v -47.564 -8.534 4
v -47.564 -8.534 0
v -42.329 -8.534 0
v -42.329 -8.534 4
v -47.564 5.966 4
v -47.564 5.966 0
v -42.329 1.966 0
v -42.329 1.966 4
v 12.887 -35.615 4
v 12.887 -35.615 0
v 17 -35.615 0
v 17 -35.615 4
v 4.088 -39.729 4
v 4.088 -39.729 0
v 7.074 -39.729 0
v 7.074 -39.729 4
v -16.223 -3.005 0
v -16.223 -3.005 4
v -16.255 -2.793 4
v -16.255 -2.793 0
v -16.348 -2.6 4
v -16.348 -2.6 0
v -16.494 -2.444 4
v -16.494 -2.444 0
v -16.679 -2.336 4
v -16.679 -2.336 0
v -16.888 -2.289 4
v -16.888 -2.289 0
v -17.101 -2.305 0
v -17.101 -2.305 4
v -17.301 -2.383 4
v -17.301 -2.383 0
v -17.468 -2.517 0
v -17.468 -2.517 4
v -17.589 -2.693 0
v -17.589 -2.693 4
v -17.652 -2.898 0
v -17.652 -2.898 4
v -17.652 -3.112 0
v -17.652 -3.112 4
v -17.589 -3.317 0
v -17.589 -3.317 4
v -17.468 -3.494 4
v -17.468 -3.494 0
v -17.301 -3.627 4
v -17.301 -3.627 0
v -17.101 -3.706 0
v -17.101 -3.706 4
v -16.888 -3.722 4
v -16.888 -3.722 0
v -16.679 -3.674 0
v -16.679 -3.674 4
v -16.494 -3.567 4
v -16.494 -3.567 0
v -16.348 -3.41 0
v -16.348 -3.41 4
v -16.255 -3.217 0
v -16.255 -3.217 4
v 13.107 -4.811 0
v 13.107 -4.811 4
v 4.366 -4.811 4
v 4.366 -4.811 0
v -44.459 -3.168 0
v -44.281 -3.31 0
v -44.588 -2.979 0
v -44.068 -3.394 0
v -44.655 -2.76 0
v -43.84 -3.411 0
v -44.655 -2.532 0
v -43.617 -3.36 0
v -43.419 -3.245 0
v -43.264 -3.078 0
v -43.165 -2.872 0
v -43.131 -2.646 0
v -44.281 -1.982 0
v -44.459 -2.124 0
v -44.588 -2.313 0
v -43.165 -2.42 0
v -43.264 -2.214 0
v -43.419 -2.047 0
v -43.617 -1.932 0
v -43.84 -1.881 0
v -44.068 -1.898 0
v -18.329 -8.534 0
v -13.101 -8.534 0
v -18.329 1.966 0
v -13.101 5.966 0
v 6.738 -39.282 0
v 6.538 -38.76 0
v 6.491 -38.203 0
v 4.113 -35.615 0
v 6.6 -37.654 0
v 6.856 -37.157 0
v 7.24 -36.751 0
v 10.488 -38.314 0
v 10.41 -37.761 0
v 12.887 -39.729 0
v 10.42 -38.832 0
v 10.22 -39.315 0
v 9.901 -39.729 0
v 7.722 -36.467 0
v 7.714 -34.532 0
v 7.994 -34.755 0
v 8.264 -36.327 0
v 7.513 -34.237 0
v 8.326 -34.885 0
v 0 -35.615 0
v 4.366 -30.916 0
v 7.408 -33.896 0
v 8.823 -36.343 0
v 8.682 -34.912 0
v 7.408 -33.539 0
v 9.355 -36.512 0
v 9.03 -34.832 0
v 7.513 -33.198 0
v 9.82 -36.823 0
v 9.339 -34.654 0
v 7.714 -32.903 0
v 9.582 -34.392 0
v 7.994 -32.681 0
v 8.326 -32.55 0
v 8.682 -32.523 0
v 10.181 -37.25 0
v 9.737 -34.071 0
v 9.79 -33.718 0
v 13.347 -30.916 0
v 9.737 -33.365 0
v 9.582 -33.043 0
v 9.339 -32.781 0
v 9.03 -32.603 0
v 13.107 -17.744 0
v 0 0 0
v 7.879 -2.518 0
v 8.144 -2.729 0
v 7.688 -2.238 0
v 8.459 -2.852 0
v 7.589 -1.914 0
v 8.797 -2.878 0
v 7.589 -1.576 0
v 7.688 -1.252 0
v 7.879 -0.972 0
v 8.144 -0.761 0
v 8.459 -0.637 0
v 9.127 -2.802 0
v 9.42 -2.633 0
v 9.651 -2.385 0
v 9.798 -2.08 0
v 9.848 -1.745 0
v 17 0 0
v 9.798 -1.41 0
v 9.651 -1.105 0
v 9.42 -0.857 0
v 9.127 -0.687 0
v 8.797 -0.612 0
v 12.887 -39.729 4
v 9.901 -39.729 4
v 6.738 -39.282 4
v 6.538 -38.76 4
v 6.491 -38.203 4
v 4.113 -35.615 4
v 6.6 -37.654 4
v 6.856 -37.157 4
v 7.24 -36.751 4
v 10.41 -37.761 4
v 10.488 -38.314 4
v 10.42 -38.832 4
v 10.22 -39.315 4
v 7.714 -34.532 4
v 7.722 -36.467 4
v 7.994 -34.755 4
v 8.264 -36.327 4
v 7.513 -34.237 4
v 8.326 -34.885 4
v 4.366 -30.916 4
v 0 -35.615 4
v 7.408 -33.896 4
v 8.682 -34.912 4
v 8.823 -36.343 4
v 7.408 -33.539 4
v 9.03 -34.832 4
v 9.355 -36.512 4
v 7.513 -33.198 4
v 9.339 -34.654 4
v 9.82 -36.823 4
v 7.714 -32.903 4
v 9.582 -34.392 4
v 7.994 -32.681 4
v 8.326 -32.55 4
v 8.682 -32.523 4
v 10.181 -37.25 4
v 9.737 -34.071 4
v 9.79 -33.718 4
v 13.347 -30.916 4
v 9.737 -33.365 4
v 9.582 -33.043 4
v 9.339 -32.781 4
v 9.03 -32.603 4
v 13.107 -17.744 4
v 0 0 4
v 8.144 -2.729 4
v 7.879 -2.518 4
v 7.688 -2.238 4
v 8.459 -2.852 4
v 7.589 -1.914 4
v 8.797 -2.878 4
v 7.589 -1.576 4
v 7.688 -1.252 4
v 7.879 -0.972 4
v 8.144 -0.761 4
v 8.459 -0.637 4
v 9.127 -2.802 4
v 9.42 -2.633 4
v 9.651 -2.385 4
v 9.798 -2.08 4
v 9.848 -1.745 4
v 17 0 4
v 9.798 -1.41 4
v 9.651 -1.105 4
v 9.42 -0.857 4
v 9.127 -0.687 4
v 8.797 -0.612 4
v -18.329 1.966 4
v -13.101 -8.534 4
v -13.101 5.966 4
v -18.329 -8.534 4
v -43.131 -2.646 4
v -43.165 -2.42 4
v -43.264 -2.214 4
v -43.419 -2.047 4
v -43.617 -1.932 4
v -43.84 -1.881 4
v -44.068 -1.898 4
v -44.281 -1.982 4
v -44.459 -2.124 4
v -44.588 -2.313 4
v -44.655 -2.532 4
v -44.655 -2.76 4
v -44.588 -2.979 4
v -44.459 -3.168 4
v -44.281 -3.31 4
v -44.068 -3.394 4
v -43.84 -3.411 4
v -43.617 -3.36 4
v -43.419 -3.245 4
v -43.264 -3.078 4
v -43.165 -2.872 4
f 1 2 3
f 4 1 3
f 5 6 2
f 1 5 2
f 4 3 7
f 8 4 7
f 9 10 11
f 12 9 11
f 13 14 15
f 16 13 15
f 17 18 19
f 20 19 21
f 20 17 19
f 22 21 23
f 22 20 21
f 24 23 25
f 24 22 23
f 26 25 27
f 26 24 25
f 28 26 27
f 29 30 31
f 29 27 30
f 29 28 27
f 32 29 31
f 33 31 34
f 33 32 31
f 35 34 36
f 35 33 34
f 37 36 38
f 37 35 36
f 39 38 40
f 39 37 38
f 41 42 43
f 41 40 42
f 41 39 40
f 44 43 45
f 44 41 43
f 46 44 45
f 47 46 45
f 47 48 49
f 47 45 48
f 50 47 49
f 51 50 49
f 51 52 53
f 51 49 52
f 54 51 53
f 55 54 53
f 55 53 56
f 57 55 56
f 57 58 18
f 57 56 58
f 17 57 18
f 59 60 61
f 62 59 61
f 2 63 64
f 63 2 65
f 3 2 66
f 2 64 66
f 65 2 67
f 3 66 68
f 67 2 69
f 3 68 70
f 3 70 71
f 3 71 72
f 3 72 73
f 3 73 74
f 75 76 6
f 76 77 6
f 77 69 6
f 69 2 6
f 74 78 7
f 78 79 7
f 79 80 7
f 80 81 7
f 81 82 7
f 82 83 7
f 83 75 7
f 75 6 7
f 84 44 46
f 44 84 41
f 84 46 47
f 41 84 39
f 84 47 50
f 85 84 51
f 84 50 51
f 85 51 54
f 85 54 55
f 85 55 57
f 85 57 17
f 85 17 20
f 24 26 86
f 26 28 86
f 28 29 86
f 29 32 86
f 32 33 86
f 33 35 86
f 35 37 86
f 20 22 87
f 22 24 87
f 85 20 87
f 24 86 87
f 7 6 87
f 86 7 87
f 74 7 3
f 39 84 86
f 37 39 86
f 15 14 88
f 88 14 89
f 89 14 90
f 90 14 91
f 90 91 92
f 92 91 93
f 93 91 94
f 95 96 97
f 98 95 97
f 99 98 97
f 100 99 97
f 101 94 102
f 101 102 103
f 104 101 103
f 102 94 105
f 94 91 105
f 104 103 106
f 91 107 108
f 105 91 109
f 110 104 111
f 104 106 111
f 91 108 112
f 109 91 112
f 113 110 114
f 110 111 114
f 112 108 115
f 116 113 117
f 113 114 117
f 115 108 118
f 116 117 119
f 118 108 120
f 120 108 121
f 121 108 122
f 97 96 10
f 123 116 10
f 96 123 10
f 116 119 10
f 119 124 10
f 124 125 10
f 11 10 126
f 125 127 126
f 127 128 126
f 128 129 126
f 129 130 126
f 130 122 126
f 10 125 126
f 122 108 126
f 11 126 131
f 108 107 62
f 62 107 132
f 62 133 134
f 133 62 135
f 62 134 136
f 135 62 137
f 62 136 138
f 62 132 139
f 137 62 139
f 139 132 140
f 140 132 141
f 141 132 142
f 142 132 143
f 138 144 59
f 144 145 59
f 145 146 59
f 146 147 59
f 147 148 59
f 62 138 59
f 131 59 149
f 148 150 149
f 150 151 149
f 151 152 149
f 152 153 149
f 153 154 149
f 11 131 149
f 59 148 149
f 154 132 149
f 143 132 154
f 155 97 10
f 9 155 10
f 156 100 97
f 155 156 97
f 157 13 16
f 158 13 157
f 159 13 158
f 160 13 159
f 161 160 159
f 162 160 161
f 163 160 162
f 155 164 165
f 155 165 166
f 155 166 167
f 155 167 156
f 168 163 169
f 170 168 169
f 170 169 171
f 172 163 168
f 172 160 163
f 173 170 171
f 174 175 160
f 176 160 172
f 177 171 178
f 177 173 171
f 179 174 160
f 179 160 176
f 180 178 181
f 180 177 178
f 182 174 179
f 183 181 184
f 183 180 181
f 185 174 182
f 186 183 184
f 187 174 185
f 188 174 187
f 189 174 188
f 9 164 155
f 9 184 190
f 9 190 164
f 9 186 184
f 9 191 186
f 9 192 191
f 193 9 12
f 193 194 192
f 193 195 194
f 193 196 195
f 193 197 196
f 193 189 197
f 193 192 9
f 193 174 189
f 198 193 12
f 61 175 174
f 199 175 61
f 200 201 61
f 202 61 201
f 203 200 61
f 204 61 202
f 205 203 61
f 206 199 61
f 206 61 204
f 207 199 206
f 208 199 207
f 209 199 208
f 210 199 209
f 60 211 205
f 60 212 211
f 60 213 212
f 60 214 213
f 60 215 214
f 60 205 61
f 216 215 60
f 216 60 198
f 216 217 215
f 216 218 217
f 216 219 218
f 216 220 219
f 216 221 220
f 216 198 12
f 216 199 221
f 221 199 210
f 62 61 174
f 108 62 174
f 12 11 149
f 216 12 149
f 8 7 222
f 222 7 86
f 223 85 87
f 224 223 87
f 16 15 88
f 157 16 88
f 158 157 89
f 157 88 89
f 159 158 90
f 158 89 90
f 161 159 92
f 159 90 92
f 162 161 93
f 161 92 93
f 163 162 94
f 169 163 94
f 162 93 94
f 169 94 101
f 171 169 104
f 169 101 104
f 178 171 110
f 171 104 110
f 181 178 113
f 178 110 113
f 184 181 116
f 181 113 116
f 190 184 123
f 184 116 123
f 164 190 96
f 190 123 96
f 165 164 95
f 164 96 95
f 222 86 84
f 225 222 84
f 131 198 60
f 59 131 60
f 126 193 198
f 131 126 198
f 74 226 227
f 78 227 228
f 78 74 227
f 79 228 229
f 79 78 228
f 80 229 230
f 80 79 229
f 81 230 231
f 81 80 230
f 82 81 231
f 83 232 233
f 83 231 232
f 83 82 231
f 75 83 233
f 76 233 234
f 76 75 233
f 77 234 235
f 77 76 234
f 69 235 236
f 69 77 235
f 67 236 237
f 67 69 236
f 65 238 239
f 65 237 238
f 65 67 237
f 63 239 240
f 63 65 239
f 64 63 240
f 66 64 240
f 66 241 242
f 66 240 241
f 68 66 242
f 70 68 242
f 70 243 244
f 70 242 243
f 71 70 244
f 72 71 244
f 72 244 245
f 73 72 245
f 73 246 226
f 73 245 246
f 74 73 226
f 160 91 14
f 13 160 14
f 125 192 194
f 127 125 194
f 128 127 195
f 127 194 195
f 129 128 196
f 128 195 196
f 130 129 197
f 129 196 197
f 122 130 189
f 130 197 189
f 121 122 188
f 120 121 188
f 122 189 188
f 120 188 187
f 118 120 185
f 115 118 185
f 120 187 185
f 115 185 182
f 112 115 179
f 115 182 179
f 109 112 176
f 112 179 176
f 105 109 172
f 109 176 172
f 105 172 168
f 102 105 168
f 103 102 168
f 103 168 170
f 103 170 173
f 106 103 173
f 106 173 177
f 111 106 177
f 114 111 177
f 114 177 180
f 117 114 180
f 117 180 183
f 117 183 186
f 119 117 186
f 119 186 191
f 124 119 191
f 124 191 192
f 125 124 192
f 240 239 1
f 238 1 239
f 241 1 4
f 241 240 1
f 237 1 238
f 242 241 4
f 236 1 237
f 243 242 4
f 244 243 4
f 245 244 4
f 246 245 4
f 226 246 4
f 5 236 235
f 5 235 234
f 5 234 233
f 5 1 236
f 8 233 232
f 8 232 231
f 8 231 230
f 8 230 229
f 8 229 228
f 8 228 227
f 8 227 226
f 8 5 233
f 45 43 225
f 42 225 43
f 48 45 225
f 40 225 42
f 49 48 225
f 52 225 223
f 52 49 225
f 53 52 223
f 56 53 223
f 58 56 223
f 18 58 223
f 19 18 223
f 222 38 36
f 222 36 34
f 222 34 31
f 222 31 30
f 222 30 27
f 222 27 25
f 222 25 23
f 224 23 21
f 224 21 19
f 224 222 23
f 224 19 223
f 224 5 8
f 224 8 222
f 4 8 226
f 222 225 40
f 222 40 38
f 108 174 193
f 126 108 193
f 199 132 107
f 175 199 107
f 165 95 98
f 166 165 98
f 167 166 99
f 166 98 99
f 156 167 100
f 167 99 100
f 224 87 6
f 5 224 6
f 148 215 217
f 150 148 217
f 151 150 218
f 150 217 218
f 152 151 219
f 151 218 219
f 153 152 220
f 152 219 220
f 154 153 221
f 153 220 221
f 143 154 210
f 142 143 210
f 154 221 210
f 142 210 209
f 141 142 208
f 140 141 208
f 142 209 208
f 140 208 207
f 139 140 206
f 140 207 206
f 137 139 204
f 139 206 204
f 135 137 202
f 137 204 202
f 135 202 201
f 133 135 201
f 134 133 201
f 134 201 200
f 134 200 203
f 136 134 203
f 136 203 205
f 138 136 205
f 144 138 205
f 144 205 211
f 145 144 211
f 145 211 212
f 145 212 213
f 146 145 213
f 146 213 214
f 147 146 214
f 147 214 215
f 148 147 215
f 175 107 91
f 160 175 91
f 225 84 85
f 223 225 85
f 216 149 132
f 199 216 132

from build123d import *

# Parameters (mm, degrees)
F2_DEPTH  = 4
F1_R      = 0.7184874266
F3_DEPTH  = 15.1
F1_R_2    = 0.7667610487
F4_DEPTH  = 25
F6_DEPTH  = 4
F11_DEPTH = 4
F12_DEPTH = 25
F14_R     = 0.9874667044
F15_DEPTH = 55.7
F16_R     = 1.136027817
F16_R_2   = 1.1974778026
F17_DEPTH = 25


with BuildPart() as f2:
    # F0 (on Top) → F2 (new body)
    with BuildSketch(Plane.XY):
        Polygon((-13.1012657657, 5.9655876346), (-47.5642964626, 5.9655876346), (-47.5642964626, -8.5344123654), (-42.329105028, -8.5344123654), (-42.329105028, 1.9655876346), (-18.329105028, 1.9655876346), (-18.329105028, -8.5344123654), (-13.1012657657, -8.5344123654), align=None)
    extrude(amount=F2_DEPTH)

    # F1 (on Top) → F3 (cut)
    with BuildSketch(Plane.XY):
        with Locations((-16.9415455312, -3.0052363873)):
            Circle(F1_R)
    extrude(amount=F3_DEPTH, mode=Mode.SUBTRACT)

    # F1 (on Top) → F4 (cut)
    with BuildSketch(Plane.XY):
        with Locations((-43.8972748816, -2.6459926739)):
            Circle(F1_R_2)
    extrude(amount=F4_DEPTH, mode=Mode.SUBTRACT)

    # F14 (on face) → F15 (cut)
    with BuildSketch(Plane.XY.offset(4)):
        with Locations((8.5520371795, -2.05092947)):
            Circle(F14_R)
    extrude(amount=F15_DEPTH, mode=Mode.SUBTRACT)


with BuildPart() as f6:
    # F5 (on Top) → F6 (new body)
    with BuildSketch(Plane.XY):
        with BuildLine():
            Line((8.5, 0), (0, 0))
            Line((0, 0), (0, -35.6148630381))
            Line((0, -35.6148630381), (4.112906754, -35.6148630381))
            Line((4.112906754, -35.6148630381), (4.0884604603, -39.7291481495))
            Line((4.0884604603, -39.7291481495), (7.074095975, -39.7291481495))
            ThreePointArc((7.074095975, -39.7291481495), (7.7220620747, -36.4667871873), (10.4877768531, -38.3144021034))
            ThreePointArc((10.4877768531, -38.3144021034), (10.3353917692, -39.0801168818), (9.9014577313, -39.7291481495))
            Line((9.9014577313, -39.7291481495), (12.887093246, -39.7291481495))
            Line((12.887093246, -39.7291481495), (12.887093246, -35.6148630381))
            Line((12.887093246, -35.6148630381), (17, -35.6148630381))
            Line((17, -35.6148630381), (17, 0))
            Line((17, 0), (8.5, 0))
        make_face()
    extrude(amount=F6_DEPTH)

    # F10 (on face) + F7 (on face) → F11 (join)
    with BuildSketch(Plane.XY.offset(4)):
        Polygon((13.1072346121, -4.8111509532), (4.3656374328, -4.8111509532), (4.3656374328, -17.7439264953), (4.3656374328, -30.9161972255), (13.3467307314, -30.9161972255), (13.1072346121, -17.7439264953), align=None)
    with BuildSketch(Plane.XY.offset(4)):
        with BuildLine():
            Line((17, -35.6148630381), (17, 0))
            Line((17, 0), (0, 0))
            Line((0, 0), (0, -35.6148630381))
            Line((0, -35.6148630381), (4.112906754, -35.6148630381))
            Line((4.112906754, -35.6148630381), (4.0884604603, -39.7291481495))
            Line((4.0884604603, -39.7291481495), (7.074095975, -39.7291481495))
            ThreePointArc((7.074095975, -39.7291481495), (7.7220620747, -36.4667871873), (10.4877768531, -38.3144021034))
            ThreePointArc((10.4877768531, -38.3144021034), (10.3353917692, -39.0801168818), (9.9014577313, -39.7291481495))
            Line((9.9014577313, -39.7291481495), (12.887093246, -39.7291481495))
            Line((12.887093246, -39.7291481495), (12.887093246, -35.6148630381))
            Line((12.887093246, -35.6148630381), (17, -35.6148630381))
        make_face()
    extrude(amount=-F11_DEPTH)

    # F10 (on face) → F12 (cut)
    with BuildSketch(Plane.XY.offset(4)):
        Polygon((13.1072346121, -4.8111509532), (4.3656374328, -4.8111509532), (4.3656374328, -17.7439264953), (4.3656374328, -30.9161972255), (13.3467307314, -30.9161972255), (13.1072346121, -17.7439264953), align=None)
    extrude(amount=-F12_DEPTH, mode=Mode.SUBTRACT)

    # F16 (on face) → F17 (cut)
    with BuildSketch(Plane.XY.offset(4)):
        with Locations((8.7120030075, -1.7449193401)):
            Circle(F16_R)
        with Locations((8.5922544822, -33.717609942)):
            Circle(F16_R_2)
    extrude(amount=-F17_DEPTH, mode=Mode.SUBTRACT)


solid = Compound([f2.part, f6.part])
